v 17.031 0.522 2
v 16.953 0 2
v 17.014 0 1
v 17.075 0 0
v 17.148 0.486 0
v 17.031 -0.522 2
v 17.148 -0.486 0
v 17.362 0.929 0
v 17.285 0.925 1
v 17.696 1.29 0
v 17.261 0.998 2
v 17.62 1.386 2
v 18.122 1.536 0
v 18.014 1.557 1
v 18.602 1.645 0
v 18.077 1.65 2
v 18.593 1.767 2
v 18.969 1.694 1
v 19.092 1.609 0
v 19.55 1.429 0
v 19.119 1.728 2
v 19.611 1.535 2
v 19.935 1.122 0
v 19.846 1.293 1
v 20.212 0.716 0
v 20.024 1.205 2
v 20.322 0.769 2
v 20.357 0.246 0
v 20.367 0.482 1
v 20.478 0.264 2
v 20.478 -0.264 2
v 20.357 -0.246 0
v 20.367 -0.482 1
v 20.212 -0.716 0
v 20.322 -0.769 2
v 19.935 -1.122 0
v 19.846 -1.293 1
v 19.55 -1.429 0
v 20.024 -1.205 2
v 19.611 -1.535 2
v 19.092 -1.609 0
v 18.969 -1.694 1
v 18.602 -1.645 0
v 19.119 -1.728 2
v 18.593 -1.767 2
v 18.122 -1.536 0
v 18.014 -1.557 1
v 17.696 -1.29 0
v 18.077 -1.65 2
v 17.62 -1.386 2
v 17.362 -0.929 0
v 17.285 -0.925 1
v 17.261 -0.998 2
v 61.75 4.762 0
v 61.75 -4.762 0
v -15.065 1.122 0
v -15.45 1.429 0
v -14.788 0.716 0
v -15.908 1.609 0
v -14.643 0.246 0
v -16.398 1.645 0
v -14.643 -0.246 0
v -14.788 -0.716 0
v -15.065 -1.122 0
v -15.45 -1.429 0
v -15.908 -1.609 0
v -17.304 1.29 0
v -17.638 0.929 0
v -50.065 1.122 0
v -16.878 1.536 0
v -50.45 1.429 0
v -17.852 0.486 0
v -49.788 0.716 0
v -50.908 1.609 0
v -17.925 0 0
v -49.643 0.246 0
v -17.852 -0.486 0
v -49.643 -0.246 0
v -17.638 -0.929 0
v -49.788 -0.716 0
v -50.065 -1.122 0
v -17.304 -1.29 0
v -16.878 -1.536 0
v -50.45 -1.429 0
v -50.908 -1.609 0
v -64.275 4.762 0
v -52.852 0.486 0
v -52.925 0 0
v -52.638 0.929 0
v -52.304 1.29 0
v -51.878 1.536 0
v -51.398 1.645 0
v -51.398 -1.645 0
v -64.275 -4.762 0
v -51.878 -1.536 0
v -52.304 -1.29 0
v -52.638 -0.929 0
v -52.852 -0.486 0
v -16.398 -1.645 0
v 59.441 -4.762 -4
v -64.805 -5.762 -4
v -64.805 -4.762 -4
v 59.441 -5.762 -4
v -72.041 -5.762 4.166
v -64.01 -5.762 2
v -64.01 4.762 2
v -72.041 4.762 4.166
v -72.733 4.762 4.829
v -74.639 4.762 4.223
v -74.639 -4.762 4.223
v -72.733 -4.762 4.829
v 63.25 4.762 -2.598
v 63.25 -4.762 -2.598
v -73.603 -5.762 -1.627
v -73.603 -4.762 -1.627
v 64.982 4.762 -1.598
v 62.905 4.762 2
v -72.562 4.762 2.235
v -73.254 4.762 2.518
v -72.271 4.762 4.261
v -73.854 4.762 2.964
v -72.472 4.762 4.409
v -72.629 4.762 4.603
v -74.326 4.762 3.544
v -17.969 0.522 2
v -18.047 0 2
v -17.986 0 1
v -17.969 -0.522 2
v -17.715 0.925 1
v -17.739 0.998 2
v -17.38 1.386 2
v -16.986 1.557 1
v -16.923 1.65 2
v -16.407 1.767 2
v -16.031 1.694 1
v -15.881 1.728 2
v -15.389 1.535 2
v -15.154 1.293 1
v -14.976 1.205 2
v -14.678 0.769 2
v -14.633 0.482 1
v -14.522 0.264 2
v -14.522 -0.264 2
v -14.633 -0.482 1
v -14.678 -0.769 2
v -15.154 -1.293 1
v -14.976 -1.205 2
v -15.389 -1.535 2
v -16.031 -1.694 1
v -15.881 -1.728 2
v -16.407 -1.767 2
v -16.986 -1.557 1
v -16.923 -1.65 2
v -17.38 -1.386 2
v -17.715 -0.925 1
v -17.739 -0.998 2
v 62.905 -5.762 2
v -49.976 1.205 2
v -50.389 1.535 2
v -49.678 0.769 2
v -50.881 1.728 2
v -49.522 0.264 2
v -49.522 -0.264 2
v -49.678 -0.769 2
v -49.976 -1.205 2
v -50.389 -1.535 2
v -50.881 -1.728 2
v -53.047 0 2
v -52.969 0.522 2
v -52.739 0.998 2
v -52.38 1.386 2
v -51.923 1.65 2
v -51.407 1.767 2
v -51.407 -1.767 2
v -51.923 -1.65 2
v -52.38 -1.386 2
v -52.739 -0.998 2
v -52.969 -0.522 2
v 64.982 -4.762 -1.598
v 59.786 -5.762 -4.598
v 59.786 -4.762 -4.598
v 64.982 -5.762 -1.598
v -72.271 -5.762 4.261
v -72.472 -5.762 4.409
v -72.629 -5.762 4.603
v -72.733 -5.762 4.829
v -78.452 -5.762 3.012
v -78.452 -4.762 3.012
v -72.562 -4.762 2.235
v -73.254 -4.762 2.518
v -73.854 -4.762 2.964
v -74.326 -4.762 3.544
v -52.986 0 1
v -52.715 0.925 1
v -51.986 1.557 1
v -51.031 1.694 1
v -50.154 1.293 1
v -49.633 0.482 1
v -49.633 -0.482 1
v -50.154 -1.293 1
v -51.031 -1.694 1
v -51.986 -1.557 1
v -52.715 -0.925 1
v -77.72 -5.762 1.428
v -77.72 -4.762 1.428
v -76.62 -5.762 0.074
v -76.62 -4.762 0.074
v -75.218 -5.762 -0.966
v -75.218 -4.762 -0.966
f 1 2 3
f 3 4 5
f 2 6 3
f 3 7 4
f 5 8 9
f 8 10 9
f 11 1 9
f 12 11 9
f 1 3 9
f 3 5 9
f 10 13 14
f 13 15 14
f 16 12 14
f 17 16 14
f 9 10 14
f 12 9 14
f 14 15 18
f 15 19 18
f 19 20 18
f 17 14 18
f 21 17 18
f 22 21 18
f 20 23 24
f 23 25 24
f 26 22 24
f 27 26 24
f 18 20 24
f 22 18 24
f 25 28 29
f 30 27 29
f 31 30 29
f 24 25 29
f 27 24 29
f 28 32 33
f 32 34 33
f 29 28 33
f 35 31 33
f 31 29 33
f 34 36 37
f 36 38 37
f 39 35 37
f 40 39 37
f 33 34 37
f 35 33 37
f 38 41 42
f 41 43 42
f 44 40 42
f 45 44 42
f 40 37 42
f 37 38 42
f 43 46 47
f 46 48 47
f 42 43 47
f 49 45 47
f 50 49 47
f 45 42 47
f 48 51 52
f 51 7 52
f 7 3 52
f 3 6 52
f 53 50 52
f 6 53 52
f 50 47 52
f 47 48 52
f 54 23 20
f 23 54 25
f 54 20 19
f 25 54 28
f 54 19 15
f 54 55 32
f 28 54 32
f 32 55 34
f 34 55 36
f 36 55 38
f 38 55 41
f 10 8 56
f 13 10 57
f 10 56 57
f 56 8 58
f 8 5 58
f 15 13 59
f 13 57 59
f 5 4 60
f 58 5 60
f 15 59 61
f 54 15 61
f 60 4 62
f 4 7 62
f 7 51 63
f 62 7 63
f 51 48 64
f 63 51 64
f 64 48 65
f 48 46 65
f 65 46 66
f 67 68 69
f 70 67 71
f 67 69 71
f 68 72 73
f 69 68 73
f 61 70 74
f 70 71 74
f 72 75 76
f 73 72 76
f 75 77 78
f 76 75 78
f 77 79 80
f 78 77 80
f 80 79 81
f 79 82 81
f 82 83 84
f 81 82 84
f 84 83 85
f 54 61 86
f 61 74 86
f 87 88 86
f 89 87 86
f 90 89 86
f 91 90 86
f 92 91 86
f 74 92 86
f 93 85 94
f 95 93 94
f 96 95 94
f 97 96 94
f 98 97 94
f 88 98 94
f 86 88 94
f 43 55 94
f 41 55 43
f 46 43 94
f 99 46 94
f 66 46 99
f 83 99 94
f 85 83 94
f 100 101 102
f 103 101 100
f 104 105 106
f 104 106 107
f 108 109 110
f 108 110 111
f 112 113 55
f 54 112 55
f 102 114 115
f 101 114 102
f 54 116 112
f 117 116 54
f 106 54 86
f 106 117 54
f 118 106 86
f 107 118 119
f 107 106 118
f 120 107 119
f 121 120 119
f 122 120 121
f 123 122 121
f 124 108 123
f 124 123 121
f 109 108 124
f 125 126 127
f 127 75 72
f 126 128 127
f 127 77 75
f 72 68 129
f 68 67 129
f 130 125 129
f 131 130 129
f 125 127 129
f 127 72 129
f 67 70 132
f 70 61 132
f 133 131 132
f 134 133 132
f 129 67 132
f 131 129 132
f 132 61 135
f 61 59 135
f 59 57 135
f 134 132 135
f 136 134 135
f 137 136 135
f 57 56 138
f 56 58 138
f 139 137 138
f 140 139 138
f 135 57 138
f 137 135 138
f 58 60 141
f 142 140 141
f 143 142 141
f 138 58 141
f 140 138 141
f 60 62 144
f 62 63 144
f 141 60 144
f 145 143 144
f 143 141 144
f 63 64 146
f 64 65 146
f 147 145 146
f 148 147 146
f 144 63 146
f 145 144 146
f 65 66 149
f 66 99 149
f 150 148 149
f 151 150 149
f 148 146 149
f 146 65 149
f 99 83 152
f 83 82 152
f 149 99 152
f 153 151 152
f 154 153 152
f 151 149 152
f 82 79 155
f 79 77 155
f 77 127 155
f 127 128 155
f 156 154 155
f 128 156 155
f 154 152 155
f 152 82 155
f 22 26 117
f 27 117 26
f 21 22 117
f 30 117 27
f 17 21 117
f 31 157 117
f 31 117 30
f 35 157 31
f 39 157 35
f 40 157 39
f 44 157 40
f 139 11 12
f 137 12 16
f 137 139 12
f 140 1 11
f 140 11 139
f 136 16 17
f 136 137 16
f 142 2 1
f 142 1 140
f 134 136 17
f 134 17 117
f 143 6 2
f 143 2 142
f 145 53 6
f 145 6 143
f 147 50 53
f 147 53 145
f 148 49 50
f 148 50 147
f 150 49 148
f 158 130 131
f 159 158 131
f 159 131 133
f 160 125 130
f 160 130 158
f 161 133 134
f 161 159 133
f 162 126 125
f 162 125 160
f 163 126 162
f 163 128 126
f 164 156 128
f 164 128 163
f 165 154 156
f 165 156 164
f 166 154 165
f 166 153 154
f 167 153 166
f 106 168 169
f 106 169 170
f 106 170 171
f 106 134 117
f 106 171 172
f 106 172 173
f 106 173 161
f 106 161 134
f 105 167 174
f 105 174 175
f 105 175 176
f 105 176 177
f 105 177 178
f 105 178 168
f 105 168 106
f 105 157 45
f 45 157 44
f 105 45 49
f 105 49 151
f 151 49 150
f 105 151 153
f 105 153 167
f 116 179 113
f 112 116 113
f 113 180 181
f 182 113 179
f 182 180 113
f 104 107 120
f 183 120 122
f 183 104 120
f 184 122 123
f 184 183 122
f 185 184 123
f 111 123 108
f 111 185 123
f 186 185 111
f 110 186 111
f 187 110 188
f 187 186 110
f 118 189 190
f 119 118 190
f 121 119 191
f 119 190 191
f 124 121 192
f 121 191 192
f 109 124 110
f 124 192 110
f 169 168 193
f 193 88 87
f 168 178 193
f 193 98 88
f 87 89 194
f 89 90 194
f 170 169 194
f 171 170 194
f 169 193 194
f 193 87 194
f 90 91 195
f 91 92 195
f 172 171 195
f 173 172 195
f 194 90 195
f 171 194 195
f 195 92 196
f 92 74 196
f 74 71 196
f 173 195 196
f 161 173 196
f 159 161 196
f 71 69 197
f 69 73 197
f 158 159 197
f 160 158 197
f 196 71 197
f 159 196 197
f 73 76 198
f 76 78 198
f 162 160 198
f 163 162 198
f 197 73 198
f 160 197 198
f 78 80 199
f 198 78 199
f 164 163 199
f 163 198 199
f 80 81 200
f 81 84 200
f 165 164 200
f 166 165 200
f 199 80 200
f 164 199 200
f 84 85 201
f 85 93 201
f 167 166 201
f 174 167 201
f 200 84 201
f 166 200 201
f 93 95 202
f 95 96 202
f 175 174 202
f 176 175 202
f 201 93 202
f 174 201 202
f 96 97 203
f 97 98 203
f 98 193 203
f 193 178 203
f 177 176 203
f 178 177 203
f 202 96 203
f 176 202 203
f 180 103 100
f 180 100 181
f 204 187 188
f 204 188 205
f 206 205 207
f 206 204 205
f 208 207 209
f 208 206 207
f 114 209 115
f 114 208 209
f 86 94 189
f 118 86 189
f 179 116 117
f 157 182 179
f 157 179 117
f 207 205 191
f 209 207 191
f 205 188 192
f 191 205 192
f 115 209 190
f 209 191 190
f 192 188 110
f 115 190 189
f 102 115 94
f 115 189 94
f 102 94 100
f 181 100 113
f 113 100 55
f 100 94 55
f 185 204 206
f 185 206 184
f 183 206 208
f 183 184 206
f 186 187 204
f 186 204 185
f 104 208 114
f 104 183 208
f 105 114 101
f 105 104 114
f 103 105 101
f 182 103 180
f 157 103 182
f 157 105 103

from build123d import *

# Parameters (mm, degrees)
EXTRUDE_THIN1_DEPTH          = 9.525
SKETCH3_R                    = 1.65
CUT_EXTRUDE1_DEPTH           = 75.946970354
CUT_EXTRUDE1_DRAFT           = 3.5
CUT_EXTRUDE1_PROFILE_2_DEPTH = 75.946970354
CUT_EXTRUDE1_PROFILE_2_DRAFT = 3.5
CUT_EXTRUDE1_PROFILE_3_DEPTH = 75.946970354
CUT_EXTRUDE1_PROFILE_3_DRAFT = 3.5
EXTRUDE_THIN2_START          = 1
EXTRUDE_THIN2_DEPTH          = 1


with BuildPart() as part:
    # Sketch2 → Extrude-Thin1 (new body)
    with BuildSketch(Plane.XZ.offset(4.7625)):
        with BuildLine():
            Line((63.25, -2.598076211), (61.75, 0))
            Line((61.75, 0), (-64.275, 0))
            Line((-64.275, 0), (-72.561586906, 2.235175454))
            ThreePointArc((-72.561586906, 2.235175454), (-73.854260092, 2.964003531), (-74.639461328, 4.223230813))
            Line((-74.639461328, 4.223230813), (-72.733358502, 4.828847868))
            ThreePointArc((-72.733358502, 4.828847868), (-72.471624756, 4.409105441), (-72.040733695, 4.166162748))
            Line((-72.040733695, 4.166162748), (-64.010001325, 2))
            Line((-64.010001325, 2), (62.904700538, 2))
            Line((62.904700538, 2), (64.982050808, -1.598076211))
            Line((64.982050808, -1.598076211), (63.25, -2.598076211))
        make_face()
    extrude(amount=-EXTRUDE_THIN1_DEPTH)


with BuildPart() as cut_extrude1_tool:
    # Sketch3 → Cut-Extrude1 (with draft: the straight prism first)
    with BuildSketch(Plane(origin=(0, 0, 0), x_dir=(-1, 0, 0), z_dir=(0, 0, -1))):
        with Locations((51.275, 0)):
            Circle(SKETCH3_R)
    extrude(amount=-CUT_EXTRUDE1_DEPTH)
    # Cut-Extrude1: the draft: its side faces are tilted about the plane it starts from
    cut_extrude1_sides = [cut_extrude1_tool.faces().sort_by_distance(p)[0] for p in [
        (-49.625, 0, 37.973485177),
    ]]
    draft(cut_extrude1_sides, Plane(origin=(0, 0, 0), x_dir=(-1, 0, 0), z_dir=(0, 0, -1)), CUT_EXTRUDE1_DRAFT)


with BuildPart() as part_1:
    add(part.part)

    # Cut-Extrude1: cut by cut_extrude1_tool
    add(cut_extrude1_tool.part, mode=Mode.SUBTRACT)


with BuildPart() as cut_extrude1_profile_2_tool:
    # Sketch3 → Cut-Extrude1 profile 2 (with draft: the straight prism first)
    with BuildSketch(Plane(origin=(0, 0, 0), x_dir=(-1, 0, 0), z_dir=(0, 0, -1))):
        with Locations((16.275, 0)):
            Circle(SKETCH3_R)
    extrude(amount=-CUT_EXTRUDE1_PROFILE_2_DEPTH)
    # Cut-Extrude1 profile 2: the draft: its side faces are tilted about the plane it starts from
    cut_extrude1_profile_2_sides = [cut_extrude1_profile_2_tool.faces().sort_by_distance(p)[0] for p in [
        (-14.625, 0, 37.973485177),
    ]]
    draft(cut_extrude1_profile_2_sides, Plane(origin=(0, 0, 0), x_dir=(-1, 0, 0), z_dir=(0, 0, -1)), CUT_EXTRUDE1_PROFILE_2_DRAFT)


with BuildPart() as part_2:
    add(part_1.part)

    # Cut-Extrude1 profile 2: cut by cut_extrude1_profile_2_tool
    add(cut_extrude1_profile_2_tool.part, mode=Mode.SUBTRACT)


with BuildPart() as cut_extrude1_profile_3_tool:
    # Sketch3 → Cut-Extrude1 profile 3 (with draft: the straight prism first)
    with BuildSketch(Plane(origin=(0, 0, 0), x_dir=(-1, 0, 0), z_dir=(0, 0, -1))):
        with Locations((-18.725, 0)):
            Circle(SKETCH3_R)
    extrude(amount=-CUT_EXTRUDE1_PROFILE_3_DEPTH)
    # Cut-Extrude1 profile 3: the draft: its side faces are tilted about the plane it starts from
    cut_extrude1_profile_3_sides = [cut_extrude1_profile_3_tool.faces().sort_by_distance(p)[0] for p in [
        (20.375, 0, 37.973485177),
    ]]
    draft(cut_extrude1_profile_3_sides, Plane(origin=(0, 0, 0), x_dir=(-1, 0, 0), z_dir=(0, 0, -1)), CUT_EXTRUDE1_PROFILE_3_DRAFT)


with BuildPart() as part_3:
    add(part_2.part)

    # Cut-Extrude1 profile 3: cut by cut_extrude1_profile_3_tool
    add(cut_extrude1_profile_3_tool.part, mode=Mode.SUBTRACT)

    # Sketch2<2> → Extrude-Thin2 (add)
    with BuildSketch(Plane.XZ.offset(4.7625).offset(EXTRUDE_THIN2_START)):
        with BuildLine():
            Line((64.982050808, -1.598076211), (62.904700538, 2))
            Line((62.904700538, 2), (-64.010001325, 2))
            Line((-64.010001325, 2), (-72.040733695, 4.166162748))
            ThreePointArc((-72.040733695, 4.166162748), (-72.471624756, 4.409105441), (-72.733358502, 4.828847868))
            Line((-72.733358502, 4.828847868), (-78.451666979, 3.011996703))
            ThreePointArc((-78.451666979, 3.011996703), (-76.619530762, 0.073799711), (-73.603293329, -1.626799136))
            Line((-73.603293329, -1.626799136), (-64.804997349, -4))
            Line((-64.804997349, -4), (59.440598923, -4))
            Line((59.440598923, -4), (59.785898385, -4.598076211))
            Line((59.785898385, -4.598076211), (64.982050808, -1.598076211))
        make_face()
    extrude(amount=-EXTRUDE_THIN2_DEPTH)


solid = part_3.part
